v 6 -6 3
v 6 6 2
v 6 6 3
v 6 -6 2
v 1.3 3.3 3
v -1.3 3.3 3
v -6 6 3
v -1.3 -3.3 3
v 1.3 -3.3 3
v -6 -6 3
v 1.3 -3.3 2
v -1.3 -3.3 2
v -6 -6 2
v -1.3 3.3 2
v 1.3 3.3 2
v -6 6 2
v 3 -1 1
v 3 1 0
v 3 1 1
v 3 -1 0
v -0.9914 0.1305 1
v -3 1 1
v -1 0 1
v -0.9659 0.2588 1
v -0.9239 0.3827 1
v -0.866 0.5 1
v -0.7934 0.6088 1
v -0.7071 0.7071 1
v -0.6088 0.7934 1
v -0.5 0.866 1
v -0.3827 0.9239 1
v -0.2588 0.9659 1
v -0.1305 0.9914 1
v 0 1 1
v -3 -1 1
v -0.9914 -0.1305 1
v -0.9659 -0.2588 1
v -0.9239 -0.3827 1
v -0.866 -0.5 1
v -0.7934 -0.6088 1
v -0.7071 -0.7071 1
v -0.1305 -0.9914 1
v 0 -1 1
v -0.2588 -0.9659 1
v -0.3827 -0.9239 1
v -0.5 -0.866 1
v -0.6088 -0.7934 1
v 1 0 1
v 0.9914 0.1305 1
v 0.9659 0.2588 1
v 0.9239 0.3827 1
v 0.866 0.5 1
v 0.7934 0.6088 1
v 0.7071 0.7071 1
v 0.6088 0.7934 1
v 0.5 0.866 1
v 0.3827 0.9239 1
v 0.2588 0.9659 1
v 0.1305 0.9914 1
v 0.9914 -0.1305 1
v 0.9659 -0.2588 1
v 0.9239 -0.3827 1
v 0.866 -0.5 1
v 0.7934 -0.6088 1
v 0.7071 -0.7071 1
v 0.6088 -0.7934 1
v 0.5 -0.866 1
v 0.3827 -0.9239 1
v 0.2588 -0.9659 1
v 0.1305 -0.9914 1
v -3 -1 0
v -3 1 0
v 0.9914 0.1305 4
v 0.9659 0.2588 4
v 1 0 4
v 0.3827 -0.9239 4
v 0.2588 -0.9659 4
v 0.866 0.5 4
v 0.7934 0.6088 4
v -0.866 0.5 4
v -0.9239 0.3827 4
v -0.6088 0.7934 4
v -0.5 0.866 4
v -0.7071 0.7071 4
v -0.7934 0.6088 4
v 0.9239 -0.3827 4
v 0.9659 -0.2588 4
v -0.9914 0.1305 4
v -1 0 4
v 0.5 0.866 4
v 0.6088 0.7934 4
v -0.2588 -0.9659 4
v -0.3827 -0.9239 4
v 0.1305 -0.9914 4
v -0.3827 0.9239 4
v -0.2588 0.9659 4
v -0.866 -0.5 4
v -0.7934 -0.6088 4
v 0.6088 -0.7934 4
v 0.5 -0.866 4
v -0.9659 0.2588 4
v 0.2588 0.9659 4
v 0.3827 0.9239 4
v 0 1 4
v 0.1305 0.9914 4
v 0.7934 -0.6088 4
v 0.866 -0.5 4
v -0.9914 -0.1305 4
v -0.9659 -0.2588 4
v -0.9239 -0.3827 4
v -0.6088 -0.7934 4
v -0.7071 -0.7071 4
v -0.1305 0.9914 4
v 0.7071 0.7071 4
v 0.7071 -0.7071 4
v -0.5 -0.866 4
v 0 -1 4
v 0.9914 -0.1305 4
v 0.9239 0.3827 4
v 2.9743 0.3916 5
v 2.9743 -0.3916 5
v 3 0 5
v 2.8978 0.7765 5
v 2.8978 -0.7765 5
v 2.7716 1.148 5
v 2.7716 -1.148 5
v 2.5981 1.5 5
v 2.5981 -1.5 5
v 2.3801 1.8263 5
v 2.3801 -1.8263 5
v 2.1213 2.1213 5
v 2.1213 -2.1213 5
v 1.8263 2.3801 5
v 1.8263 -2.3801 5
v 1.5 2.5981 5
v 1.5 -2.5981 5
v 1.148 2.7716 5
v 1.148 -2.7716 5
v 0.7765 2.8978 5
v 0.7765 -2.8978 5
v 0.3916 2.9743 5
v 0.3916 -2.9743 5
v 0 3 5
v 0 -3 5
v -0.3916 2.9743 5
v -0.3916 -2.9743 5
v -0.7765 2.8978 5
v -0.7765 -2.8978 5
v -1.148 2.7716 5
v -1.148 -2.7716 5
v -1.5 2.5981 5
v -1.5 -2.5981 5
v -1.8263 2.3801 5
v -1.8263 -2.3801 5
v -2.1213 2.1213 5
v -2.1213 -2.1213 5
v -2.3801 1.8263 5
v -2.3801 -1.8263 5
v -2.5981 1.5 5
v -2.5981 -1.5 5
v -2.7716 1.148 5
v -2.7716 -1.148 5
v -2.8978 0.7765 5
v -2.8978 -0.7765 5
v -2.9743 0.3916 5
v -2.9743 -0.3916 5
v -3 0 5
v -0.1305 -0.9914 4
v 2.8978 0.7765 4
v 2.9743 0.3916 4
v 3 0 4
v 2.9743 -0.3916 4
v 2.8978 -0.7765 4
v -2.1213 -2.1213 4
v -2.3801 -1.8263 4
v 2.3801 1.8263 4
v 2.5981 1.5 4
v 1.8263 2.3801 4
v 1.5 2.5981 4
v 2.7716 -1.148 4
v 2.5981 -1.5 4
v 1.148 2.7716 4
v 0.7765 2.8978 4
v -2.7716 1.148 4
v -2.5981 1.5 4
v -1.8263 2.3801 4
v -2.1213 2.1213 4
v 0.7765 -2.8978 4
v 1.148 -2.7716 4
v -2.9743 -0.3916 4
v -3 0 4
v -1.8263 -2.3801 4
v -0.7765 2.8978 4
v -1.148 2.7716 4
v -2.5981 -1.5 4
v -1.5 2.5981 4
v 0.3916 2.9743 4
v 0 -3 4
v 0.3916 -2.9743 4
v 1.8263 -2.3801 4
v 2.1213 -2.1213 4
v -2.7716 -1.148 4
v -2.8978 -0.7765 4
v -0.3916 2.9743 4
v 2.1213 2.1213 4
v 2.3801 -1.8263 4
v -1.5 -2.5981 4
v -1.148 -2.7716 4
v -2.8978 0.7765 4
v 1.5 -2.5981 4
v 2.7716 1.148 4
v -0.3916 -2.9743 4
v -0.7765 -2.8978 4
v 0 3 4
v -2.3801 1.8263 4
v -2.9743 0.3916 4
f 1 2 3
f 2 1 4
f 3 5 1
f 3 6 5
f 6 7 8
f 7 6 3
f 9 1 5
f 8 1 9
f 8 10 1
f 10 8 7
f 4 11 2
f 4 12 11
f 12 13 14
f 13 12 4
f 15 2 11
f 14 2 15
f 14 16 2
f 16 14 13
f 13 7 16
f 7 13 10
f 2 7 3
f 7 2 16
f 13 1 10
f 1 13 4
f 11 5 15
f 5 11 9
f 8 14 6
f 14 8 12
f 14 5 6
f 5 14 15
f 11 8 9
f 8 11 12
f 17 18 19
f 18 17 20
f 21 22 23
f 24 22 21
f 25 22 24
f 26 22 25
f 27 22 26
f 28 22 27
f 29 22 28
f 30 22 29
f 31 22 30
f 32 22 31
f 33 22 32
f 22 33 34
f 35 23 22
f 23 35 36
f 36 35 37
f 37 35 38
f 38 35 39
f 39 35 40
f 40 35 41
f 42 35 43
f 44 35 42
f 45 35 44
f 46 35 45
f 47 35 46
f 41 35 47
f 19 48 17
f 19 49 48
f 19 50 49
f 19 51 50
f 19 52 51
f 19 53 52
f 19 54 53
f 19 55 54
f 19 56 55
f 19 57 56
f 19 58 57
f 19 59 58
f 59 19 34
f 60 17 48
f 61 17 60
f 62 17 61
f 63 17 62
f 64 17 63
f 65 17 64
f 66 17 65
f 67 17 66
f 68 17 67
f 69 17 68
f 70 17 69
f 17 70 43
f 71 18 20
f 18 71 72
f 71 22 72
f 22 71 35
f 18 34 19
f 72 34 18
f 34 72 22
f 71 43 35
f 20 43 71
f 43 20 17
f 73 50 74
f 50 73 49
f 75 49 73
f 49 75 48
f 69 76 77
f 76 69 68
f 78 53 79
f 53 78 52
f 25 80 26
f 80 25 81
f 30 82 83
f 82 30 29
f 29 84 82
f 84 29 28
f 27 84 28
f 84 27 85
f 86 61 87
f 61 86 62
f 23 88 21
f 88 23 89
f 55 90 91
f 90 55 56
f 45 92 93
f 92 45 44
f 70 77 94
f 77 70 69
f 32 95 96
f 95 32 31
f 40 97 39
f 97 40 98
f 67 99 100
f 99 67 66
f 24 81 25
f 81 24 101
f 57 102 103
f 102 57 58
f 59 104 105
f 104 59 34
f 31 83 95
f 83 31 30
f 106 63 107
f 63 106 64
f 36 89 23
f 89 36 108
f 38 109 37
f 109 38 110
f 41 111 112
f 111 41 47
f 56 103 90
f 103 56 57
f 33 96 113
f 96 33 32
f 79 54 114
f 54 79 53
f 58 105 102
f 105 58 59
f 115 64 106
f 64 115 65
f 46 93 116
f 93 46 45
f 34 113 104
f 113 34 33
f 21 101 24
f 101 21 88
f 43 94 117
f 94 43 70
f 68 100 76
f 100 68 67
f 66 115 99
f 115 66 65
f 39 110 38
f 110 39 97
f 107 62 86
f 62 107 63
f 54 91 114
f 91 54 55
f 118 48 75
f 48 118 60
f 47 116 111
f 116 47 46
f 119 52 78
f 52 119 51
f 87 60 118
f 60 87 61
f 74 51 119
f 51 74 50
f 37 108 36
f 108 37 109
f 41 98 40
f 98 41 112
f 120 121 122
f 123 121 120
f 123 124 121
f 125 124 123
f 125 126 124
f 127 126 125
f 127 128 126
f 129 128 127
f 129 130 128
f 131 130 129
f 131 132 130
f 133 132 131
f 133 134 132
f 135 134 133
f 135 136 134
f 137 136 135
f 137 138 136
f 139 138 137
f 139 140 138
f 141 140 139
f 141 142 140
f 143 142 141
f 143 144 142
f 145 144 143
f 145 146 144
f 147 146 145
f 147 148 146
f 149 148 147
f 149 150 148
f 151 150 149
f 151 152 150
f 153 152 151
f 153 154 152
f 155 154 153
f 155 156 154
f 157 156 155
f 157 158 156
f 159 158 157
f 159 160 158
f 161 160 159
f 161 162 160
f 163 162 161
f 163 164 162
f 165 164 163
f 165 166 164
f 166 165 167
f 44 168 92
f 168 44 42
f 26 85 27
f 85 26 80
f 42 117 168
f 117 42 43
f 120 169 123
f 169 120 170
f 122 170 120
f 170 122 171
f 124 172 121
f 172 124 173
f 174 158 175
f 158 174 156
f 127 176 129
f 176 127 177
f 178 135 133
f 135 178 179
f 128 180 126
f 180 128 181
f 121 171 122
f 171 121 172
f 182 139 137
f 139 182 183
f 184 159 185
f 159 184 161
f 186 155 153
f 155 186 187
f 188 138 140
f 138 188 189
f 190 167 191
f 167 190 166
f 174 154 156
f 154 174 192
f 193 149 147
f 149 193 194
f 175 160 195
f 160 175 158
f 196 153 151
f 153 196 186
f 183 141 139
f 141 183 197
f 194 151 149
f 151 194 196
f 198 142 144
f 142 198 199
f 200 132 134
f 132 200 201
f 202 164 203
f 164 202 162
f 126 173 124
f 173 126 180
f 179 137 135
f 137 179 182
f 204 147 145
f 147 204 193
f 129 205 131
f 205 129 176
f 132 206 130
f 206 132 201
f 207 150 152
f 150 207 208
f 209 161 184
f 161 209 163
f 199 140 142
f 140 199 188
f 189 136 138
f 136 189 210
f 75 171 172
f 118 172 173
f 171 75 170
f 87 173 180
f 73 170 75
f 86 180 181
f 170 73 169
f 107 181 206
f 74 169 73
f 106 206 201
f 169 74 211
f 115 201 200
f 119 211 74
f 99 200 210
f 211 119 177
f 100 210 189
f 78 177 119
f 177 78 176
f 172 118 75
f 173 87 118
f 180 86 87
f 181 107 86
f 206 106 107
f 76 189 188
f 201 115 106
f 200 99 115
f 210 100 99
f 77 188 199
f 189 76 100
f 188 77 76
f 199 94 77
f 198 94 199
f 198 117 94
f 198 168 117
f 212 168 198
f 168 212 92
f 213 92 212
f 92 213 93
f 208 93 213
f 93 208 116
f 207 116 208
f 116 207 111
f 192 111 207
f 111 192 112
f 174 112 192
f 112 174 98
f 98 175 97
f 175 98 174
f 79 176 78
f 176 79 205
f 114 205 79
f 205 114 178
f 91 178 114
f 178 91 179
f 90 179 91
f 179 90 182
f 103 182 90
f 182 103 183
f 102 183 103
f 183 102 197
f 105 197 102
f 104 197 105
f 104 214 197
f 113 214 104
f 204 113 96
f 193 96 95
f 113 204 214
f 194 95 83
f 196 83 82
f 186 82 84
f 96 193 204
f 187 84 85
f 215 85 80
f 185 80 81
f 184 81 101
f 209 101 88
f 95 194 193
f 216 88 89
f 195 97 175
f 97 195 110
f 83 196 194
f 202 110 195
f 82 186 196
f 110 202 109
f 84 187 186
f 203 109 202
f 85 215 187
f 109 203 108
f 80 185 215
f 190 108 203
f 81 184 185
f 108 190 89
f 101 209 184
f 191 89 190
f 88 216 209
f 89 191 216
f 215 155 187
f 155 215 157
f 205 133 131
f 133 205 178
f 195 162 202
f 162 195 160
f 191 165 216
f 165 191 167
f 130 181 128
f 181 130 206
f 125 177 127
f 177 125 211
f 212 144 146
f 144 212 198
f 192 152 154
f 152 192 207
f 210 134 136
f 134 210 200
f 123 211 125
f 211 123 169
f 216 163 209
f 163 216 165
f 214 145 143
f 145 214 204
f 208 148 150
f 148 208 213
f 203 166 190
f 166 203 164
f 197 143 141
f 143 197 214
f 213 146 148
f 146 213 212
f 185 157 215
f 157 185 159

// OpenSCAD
// Original rigid geometry fixture: quarter-turn release, not a load-rated design.
// Work interval: -45..45 degrees. Release at 90 degrees, then withdraw +Z.
agentscad_part = "all";
release_angle = 0;
withdrawal = 0;
$fn = 48;

module support() {
    difference() {
        translate([-6,-6,2]) cube([12,12,1]);
        translate([-1.3,-3.3,1.9]) cube([2.6,6.6,1.2]);
    }
}
module rotor() {
    union() {
        translate([-3,-1,0]) cube([6,2,1]);
        cylinder(d=2,h=5);
        translate([0,0,4]) cylinder(d=6,h=1);
    }
}
module generated_part() {
    if (agentscad_part == "support") support();
    else if (agentscad_part == "rotor") rotor();
    else {
        support();
        translate([0,0,withdrawal]) rotate([0,0,release_angle]) rotor();
    }
}
generated_part();
